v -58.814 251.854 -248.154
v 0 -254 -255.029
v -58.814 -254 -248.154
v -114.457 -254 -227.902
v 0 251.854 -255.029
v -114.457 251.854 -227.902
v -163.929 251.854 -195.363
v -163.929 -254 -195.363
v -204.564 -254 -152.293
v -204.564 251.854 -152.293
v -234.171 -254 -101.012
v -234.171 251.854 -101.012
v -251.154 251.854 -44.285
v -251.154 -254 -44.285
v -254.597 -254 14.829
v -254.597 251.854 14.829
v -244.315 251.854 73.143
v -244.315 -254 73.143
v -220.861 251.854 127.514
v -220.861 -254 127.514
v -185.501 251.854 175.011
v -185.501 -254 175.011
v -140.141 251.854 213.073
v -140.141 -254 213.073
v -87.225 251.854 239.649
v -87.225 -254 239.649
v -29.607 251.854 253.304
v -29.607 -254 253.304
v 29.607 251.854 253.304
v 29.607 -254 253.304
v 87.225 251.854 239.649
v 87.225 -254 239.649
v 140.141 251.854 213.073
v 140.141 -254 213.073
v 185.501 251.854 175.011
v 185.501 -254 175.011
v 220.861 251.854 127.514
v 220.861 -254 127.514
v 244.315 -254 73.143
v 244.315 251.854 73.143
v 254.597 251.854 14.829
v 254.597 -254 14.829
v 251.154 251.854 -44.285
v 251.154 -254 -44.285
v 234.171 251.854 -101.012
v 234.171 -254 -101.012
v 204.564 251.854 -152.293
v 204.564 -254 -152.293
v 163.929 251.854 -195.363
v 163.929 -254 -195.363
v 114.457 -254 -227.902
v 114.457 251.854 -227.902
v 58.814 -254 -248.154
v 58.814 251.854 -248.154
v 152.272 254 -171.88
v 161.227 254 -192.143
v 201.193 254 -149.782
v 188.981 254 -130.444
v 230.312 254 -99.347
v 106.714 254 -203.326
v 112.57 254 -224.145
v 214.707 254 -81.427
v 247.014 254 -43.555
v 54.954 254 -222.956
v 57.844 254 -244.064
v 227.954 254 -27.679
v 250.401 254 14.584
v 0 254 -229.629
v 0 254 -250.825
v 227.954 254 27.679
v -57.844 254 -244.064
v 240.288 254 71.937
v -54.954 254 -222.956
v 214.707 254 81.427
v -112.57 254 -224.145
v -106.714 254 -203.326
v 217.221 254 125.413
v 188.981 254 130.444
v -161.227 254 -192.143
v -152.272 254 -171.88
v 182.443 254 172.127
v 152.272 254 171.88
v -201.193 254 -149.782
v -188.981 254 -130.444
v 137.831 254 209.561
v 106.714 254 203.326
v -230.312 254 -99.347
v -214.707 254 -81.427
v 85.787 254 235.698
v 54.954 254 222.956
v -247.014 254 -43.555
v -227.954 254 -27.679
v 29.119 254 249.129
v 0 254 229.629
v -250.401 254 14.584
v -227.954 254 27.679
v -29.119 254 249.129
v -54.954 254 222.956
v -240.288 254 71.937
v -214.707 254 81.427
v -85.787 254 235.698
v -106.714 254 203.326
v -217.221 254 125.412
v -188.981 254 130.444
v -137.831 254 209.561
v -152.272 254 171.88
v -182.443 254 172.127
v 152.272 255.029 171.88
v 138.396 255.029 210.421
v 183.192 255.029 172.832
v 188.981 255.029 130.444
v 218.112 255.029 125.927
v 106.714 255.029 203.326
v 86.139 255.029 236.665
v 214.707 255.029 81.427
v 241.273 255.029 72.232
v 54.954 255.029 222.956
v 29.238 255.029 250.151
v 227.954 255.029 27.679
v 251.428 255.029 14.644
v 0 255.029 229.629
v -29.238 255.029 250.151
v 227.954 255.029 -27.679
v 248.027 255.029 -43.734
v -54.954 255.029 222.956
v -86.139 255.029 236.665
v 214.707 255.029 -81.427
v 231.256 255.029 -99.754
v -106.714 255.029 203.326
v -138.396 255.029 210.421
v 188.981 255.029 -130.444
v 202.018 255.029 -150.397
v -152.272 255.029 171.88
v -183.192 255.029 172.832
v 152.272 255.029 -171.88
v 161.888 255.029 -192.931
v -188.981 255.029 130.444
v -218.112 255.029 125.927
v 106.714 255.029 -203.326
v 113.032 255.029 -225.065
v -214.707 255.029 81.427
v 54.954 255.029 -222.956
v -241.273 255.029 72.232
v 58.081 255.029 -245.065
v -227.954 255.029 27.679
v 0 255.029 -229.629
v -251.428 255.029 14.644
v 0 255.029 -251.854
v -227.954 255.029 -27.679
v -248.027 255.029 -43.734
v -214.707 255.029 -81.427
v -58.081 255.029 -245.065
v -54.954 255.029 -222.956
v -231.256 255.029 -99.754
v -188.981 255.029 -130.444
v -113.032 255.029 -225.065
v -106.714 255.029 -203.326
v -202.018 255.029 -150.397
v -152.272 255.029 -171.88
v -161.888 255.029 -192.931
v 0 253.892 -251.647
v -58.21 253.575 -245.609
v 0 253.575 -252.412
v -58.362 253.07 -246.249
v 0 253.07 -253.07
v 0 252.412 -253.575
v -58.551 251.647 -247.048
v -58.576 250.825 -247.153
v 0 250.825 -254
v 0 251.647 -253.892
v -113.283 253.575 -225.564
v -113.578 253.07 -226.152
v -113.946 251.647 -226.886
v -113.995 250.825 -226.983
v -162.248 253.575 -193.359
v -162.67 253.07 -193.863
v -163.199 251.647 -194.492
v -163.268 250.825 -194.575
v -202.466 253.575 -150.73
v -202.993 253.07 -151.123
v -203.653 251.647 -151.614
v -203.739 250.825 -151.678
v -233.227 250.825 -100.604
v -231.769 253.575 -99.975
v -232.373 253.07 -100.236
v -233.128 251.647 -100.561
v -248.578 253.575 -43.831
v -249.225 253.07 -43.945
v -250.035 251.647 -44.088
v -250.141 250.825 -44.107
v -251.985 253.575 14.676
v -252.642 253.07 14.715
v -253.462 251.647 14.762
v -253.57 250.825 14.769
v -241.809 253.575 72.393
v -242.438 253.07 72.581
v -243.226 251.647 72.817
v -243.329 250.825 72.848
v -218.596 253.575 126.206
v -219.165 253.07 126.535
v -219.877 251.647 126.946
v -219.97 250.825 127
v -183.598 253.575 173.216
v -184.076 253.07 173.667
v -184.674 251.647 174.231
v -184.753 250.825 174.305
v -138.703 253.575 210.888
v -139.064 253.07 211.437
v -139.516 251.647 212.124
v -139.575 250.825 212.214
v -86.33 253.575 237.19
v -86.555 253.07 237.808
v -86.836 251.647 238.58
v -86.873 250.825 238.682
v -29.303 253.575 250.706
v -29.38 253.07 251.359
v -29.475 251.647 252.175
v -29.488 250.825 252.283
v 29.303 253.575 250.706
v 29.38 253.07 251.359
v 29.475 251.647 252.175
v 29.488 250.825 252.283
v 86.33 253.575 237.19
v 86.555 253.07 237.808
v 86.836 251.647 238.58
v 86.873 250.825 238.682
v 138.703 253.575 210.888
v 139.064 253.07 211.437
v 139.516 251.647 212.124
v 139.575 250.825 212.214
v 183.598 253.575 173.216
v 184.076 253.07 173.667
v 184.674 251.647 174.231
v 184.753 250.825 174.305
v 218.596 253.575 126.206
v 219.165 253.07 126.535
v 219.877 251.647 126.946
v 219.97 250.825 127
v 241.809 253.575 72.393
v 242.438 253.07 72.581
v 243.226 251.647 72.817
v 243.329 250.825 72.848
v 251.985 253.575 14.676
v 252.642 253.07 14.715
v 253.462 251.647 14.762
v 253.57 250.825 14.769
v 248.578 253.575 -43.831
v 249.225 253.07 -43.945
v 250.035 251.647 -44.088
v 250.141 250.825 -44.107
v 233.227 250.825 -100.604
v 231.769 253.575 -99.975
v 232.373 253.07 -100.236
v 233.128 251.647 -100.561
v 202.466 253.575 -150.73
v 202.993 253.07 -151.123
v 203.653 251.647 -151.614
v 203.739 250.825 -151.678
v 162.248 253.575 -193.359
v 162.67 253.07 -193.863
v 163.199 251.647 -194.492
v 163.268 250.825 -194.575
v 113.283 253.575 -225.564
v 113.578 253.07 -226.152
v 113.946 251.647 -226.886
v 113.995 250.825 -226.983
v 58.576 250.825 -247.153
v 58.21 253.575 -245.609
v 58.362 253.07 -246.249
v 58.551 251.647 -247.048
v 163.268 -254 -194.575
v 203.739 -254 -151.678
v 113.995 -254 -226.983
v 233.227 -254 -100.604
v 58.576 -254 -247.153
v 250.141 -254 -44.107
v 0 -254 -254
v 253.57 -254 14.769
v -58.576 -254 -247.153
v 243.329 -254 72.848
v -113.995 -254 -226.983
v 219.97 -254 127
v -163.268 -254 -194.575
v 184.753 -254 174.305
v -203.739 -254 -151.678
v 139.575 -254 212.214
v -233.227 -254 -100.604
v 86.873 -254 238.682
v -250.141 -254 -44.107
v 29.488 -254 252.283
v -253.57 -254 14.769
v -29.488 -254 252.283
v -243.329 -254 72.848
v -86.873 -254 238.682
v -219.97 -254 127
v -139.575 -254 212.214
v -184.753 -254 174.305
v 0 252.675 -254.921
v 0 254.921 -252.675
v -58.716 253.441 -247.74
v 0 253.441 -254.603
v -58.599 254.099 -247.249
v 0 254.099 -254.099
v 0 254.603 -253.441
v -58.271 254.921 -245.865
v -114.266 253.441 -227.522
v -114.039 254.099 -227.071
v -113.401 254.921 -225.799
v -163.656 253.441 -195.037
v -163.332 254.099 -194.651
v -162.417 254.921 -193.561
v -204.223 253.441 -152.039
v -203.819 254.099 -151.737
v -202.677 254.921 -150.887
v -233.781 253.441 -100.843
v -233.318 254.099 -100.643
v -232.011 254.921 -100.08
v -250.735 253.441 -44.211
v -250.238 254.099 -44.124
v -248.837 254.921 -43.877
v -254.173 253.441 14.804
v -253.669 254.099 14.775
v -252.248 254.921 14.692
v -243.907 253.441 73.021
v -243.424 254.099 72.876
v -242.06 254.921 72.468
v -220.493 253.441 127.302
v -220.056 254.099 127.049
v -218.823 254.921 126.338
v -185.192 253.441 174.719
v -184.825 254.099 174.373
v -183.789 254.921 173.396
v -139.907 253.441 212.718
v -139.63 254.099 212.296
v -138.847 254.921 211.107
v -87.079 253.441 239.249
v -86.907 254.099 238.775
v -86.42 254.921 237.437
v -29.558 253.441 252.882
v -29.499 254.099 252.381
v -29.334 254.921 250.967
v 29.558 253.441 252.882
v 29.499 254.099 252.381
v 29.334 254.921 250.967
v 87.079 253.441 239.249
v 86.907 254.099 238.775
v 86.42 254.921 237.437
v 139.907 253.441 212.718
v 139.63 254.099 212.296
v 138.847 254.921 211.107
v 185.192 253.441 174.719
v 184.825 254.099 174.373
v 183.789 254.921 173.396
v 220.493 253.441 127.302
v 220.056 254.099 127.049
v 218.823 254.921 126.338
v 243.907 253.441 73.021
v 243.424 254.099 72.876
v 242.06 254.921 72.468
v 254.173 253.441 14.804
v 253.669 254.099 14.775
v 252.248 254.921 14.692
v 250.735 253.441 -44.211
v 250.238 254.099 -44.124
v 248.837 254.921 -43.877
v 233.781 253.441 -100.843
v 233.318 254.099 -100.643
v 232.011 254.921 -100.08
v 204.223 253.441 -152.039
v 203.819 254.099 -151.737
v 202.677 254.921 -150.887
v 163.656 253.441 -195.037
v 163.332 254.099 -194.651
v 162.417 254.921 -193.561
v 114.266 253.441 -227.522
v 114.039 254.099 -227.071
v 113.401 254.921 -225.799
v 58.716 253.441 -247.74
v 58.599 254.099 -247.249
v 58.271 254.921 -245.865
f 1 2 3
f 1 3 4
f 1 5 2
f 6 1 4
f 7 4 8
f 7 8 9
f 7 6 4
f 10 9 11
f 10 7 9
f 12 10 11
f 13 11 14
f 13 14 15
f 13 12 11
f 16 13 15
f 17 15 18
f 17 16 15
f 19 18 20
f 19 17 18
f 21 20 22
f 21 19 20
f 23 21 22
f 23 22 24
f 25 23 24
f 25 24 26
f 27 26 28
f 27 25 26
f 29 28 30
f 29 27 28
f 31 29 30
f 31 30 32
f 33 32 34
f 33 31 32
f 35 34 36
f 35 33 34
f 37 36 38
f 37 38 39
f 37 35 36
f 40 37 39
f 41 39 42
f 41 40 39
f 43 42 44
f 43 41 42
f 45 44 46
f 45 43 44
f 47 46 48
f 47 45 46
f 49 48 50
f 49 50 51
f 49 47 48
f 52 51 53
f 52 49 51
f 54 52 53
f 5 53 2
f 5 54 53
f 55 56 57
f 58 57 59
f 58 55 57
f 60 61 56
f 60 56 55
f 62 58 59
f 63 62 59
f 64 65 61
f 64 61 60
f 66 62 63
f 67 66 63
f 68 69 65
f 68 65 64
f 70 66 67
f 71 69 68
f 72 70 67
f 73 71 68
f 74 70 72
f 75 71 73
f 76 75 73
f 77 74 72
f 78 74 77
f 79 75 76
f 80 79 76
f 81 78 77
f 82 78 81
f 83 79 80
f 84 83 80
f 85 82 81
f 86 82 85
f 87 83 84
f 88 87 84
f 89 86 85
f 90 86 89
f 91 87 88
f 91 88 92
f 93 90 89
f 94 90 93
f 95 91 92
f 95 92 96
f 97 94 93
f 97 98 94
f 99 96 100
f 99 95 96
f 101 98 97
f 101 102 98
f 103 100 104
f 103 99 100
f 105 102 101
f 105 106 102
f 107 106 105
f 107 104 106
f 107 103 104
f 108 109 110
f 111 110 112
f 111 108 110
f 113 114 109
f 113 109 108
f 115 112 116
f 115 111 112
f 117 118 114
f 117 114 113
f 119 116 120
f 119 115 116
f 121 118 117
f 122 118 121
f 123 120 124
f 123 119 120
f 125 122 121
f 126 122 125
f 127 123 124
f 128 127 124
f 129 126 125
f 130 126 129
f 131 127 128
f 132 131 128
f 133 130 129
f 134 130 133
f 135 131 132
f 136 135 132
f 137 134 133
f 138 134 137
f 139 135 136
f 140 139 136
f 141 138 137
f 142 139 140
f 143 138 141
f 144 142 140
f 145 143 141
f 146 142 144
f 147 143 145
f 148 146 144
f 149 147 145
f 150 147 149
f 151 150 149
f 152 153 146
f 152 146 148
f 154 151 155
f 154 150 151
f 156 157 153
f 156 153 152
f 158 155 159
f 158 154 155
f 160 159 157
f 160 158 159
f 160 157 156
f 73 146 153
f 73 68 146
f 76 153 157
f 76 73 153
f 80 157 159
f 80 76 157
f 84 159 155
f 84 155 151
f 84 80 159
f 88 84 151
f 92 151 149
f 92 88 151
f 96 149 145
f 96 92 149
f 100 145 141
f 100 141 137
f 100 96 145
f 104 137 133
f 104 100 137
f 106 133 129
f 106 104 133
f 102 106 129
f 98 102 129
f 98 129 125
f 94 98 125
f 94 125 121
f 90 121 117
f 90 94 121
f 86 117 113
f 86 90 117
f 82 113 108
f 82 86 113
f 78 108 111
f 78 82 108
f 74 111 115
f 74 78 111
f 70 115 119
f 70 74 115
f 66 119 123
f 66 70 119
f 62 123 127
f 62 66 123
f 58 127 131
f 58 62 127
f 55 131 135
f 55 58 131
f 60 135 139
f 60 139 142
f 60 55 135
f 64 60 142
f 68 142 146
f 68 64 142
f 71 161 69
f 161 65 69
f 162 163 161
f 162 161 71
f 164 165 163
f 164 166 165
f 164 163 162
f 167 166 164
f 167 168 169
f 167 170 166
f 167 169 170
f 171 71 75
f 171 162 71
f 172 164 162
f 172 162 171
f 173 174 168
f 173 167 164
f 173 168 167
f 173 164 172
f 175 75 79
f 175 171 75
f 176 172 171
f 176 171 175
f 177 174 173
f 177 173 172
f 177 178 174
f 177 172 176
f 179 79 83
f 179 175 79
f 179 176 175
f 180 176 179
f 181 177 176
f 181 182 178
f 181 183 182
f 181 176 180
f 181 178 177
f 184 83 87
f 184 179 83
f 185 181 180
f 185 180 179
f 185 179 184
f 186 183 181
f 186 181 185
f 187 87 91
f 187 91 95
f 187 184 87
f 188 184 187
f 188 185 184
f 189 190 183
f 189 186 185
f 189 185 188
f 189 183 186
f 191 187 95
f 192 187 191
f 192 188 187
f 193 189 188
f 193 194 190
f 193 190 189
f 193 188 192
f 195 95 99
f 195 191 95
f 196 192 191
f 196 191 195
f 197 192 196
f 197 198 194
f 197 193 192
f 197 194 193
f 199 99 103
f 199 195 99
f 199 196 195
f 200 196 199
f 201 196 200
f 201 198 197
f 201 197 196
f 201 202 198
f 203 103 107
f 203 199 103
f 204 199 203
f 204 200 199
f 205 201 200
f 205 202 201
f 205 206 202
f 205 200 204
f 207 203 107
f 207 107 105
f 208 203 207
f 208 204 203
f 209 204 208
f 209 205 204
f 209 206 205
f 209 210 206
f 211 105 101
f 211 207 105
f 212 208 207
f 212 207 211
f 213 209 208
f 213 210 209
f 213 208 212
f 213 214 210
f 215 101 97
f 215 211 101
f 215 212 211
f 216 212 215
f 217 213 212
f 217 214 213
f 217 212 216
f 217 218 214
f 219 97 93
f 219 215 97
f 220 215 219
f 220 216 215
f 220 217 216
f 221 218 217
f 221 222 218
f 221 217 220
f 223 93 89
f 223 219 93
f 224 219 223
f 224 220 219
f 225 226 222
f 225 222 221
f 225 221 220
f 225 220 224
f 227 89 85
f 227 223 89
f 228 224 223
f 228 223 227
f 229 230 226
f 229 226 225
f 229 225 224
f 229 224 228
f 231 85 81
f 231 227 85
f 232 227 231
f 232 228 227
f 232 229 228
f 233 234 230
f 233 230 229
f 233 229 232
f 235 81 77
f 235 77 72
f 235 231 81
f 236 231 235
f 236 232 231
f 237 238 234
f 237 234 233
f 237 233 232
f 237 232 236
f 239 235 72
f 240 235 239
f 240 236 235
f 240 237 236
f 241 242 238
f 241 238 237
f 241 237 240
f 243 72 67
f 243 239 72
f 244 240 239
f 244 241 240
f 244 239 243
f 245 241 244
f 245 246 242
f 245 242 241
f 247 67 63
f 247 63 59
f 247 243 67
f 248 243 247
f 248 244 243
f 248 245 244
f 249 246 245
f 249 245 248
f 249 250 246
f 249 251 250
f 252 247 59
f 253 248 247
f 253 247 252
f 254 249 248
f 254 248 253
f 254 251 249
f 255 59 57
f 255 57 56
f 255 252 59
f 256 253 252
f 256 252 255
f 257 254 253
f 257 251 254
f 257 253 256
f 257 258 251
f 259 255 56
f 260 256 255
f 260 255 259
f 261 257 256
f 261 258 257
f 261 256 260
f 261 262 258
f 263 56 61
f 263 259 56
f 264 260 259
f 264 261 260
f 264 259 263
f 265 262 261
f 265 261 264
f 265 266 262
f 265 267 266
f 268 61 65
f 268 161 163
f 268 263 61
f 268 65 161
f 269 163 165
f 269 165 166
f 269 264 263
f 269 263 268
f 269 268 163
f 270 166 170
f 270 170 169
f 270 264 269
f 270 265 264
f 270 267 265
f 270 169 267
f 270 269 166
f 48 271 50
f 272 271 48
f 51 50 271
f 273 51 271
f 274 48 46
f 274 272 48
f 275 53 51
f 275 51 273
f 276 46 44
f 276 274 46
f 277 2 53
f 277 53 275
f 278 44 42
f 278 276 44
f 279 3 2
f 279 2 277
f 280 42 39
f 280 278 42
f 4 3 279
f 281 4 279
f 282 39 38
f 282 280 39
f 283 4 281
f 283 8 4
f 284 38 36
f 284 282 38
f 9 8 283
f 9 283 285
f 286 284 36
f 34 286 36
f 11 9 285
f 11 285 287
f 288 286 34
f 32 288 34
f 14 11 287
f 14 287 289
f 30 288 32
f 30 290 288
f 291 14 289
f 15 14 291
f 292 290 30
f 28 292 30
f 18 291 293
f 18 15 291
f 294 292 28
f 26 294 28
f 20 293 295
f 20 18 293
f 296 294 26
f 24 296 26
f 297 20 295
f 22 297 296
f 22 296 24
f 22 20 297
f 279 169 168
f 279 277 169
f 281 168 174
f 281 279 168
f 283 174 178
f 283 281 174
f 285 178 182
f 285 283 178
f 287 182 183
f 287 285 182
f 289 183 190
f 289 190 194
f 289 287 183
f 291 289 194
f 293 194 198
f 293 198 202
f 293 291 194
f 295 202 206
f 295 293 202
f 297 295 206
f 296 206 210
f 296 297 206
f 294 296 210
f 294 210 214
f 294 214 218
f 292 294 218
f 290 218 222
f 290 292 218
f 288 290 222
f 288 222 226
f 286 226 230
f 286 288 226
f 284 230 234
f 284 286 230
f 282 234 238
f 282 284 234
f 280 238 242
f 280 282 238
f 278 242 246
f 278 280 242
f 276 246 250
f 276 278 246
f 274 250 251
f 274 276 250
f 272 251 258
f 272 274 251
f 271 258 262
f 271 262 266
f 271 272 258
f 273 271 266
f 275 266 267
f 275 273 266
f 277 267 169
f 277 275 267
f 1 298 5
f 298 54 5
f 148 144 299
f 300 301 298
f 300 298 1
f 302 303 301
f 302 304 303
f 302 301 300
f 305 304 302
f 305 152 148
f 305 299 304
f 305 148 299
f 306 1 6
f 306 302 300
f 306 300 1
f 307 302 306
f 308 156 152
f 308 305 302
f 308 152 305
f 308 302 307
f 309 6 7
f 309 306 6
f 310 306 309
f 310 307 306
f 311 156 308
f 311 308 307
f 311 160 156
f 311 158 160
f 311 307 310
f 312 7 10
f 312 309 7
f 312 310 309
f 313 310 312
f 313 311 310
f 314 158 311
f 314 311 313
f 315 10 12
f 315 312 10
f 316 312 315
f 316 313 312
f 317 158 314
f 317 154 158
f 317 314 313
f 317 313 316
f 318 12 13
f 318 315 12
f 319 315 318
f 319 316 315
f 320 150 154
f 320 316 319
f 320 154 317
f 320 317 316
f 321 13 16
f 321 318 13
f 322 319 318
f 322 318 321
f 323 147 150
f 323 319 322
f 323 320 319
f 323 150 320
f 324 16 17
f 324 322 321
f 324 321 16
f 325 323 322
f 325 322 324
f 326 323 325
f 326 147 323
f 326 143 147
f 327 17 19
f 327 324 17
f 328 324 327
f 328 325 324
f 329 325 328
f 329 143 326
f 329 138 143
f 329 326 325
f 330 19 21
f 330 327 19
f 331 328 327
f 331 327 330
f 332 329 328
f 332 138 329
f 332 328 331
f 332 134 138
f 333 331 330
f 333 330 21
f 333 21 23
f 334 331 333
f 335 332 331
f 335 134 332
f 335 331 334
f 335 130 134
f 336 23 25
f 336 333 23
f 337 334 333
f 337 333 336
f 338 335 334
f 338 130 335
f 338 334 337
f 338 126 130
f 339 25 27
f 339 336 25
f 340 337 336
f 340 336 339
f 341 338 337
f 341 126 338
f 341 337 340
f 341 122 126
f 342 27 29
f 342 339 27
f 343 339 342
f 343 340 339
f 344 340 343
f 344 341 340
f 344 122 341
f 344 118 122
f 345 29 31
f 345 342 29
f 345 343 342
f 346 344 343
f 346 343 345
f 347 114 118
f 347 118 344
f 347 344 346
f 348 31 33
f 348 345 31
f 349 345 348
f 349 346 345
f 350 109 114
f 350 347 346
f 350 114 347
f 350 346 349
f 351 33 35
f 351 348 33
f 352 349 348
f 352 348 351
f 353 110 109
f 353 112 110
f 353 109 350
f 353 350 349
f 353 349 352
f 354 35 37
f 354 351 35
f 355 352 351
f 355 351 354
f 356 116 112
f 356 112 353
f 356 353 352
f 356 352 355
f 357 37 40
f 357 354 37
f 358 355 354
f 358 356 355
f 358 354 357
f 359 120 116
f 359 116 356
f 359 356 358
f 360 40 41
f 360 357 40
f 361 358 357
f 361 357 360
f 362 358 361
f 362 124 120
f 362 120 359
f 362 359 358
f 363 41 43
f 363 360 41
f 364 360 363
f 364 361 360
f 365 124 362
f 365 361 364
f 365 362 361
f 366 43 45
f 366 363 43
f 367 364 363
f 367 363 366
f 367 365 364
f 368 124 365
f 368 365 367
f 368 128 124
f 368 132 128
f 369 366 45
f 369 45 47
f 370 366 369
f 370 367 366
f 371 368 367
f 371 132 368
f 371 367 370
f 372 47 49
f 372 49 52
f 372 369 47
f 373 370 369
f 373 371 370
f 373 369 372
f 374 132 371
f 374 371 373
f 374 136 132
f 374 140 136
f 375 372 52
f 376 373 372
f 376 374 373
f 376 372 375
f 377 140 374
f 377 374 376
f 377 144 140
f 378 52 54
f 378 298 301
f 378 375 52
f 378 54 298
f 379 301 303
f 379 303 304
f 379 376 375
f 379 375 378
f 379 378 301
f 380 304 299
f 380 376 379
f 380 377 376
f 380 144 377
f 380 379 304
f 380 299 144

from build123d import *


with BuildPart() as part:
    # Sketch8 → Revolve1 (revolve)
    with BuildSketch(Plane(origin=(0, 0, 0), x_dir=(0, 0, -1), z_dir=(1, 0, 0))):
        with BuildLine():
            Line((254, 0), (254, -254))
            Line((254, -254), (255.0287, -254))
            Line((255.0287, -254), (255.0287, 251.8537))
            ThreePointArc((255.0287, 251.8537), (254.09876403, 254.09876403), (251.8537, 255.0287))
            Line((251.8537, 255.0287), (229.6287, 255.0287))
            Line((229.6287, 255.0287), (229.6287, 254))
            Line((229.6287, 254), (250.825, 254))
            ThreePointArc((250.825, 254), (253.07006403, 253.07006403), (254, 250.825))
            Line((254, 250.825), (254, 0))
        make_face()
    revolve(axis=Axis((0, 0, 0), (0, 1, 0)))


solid = part.part
